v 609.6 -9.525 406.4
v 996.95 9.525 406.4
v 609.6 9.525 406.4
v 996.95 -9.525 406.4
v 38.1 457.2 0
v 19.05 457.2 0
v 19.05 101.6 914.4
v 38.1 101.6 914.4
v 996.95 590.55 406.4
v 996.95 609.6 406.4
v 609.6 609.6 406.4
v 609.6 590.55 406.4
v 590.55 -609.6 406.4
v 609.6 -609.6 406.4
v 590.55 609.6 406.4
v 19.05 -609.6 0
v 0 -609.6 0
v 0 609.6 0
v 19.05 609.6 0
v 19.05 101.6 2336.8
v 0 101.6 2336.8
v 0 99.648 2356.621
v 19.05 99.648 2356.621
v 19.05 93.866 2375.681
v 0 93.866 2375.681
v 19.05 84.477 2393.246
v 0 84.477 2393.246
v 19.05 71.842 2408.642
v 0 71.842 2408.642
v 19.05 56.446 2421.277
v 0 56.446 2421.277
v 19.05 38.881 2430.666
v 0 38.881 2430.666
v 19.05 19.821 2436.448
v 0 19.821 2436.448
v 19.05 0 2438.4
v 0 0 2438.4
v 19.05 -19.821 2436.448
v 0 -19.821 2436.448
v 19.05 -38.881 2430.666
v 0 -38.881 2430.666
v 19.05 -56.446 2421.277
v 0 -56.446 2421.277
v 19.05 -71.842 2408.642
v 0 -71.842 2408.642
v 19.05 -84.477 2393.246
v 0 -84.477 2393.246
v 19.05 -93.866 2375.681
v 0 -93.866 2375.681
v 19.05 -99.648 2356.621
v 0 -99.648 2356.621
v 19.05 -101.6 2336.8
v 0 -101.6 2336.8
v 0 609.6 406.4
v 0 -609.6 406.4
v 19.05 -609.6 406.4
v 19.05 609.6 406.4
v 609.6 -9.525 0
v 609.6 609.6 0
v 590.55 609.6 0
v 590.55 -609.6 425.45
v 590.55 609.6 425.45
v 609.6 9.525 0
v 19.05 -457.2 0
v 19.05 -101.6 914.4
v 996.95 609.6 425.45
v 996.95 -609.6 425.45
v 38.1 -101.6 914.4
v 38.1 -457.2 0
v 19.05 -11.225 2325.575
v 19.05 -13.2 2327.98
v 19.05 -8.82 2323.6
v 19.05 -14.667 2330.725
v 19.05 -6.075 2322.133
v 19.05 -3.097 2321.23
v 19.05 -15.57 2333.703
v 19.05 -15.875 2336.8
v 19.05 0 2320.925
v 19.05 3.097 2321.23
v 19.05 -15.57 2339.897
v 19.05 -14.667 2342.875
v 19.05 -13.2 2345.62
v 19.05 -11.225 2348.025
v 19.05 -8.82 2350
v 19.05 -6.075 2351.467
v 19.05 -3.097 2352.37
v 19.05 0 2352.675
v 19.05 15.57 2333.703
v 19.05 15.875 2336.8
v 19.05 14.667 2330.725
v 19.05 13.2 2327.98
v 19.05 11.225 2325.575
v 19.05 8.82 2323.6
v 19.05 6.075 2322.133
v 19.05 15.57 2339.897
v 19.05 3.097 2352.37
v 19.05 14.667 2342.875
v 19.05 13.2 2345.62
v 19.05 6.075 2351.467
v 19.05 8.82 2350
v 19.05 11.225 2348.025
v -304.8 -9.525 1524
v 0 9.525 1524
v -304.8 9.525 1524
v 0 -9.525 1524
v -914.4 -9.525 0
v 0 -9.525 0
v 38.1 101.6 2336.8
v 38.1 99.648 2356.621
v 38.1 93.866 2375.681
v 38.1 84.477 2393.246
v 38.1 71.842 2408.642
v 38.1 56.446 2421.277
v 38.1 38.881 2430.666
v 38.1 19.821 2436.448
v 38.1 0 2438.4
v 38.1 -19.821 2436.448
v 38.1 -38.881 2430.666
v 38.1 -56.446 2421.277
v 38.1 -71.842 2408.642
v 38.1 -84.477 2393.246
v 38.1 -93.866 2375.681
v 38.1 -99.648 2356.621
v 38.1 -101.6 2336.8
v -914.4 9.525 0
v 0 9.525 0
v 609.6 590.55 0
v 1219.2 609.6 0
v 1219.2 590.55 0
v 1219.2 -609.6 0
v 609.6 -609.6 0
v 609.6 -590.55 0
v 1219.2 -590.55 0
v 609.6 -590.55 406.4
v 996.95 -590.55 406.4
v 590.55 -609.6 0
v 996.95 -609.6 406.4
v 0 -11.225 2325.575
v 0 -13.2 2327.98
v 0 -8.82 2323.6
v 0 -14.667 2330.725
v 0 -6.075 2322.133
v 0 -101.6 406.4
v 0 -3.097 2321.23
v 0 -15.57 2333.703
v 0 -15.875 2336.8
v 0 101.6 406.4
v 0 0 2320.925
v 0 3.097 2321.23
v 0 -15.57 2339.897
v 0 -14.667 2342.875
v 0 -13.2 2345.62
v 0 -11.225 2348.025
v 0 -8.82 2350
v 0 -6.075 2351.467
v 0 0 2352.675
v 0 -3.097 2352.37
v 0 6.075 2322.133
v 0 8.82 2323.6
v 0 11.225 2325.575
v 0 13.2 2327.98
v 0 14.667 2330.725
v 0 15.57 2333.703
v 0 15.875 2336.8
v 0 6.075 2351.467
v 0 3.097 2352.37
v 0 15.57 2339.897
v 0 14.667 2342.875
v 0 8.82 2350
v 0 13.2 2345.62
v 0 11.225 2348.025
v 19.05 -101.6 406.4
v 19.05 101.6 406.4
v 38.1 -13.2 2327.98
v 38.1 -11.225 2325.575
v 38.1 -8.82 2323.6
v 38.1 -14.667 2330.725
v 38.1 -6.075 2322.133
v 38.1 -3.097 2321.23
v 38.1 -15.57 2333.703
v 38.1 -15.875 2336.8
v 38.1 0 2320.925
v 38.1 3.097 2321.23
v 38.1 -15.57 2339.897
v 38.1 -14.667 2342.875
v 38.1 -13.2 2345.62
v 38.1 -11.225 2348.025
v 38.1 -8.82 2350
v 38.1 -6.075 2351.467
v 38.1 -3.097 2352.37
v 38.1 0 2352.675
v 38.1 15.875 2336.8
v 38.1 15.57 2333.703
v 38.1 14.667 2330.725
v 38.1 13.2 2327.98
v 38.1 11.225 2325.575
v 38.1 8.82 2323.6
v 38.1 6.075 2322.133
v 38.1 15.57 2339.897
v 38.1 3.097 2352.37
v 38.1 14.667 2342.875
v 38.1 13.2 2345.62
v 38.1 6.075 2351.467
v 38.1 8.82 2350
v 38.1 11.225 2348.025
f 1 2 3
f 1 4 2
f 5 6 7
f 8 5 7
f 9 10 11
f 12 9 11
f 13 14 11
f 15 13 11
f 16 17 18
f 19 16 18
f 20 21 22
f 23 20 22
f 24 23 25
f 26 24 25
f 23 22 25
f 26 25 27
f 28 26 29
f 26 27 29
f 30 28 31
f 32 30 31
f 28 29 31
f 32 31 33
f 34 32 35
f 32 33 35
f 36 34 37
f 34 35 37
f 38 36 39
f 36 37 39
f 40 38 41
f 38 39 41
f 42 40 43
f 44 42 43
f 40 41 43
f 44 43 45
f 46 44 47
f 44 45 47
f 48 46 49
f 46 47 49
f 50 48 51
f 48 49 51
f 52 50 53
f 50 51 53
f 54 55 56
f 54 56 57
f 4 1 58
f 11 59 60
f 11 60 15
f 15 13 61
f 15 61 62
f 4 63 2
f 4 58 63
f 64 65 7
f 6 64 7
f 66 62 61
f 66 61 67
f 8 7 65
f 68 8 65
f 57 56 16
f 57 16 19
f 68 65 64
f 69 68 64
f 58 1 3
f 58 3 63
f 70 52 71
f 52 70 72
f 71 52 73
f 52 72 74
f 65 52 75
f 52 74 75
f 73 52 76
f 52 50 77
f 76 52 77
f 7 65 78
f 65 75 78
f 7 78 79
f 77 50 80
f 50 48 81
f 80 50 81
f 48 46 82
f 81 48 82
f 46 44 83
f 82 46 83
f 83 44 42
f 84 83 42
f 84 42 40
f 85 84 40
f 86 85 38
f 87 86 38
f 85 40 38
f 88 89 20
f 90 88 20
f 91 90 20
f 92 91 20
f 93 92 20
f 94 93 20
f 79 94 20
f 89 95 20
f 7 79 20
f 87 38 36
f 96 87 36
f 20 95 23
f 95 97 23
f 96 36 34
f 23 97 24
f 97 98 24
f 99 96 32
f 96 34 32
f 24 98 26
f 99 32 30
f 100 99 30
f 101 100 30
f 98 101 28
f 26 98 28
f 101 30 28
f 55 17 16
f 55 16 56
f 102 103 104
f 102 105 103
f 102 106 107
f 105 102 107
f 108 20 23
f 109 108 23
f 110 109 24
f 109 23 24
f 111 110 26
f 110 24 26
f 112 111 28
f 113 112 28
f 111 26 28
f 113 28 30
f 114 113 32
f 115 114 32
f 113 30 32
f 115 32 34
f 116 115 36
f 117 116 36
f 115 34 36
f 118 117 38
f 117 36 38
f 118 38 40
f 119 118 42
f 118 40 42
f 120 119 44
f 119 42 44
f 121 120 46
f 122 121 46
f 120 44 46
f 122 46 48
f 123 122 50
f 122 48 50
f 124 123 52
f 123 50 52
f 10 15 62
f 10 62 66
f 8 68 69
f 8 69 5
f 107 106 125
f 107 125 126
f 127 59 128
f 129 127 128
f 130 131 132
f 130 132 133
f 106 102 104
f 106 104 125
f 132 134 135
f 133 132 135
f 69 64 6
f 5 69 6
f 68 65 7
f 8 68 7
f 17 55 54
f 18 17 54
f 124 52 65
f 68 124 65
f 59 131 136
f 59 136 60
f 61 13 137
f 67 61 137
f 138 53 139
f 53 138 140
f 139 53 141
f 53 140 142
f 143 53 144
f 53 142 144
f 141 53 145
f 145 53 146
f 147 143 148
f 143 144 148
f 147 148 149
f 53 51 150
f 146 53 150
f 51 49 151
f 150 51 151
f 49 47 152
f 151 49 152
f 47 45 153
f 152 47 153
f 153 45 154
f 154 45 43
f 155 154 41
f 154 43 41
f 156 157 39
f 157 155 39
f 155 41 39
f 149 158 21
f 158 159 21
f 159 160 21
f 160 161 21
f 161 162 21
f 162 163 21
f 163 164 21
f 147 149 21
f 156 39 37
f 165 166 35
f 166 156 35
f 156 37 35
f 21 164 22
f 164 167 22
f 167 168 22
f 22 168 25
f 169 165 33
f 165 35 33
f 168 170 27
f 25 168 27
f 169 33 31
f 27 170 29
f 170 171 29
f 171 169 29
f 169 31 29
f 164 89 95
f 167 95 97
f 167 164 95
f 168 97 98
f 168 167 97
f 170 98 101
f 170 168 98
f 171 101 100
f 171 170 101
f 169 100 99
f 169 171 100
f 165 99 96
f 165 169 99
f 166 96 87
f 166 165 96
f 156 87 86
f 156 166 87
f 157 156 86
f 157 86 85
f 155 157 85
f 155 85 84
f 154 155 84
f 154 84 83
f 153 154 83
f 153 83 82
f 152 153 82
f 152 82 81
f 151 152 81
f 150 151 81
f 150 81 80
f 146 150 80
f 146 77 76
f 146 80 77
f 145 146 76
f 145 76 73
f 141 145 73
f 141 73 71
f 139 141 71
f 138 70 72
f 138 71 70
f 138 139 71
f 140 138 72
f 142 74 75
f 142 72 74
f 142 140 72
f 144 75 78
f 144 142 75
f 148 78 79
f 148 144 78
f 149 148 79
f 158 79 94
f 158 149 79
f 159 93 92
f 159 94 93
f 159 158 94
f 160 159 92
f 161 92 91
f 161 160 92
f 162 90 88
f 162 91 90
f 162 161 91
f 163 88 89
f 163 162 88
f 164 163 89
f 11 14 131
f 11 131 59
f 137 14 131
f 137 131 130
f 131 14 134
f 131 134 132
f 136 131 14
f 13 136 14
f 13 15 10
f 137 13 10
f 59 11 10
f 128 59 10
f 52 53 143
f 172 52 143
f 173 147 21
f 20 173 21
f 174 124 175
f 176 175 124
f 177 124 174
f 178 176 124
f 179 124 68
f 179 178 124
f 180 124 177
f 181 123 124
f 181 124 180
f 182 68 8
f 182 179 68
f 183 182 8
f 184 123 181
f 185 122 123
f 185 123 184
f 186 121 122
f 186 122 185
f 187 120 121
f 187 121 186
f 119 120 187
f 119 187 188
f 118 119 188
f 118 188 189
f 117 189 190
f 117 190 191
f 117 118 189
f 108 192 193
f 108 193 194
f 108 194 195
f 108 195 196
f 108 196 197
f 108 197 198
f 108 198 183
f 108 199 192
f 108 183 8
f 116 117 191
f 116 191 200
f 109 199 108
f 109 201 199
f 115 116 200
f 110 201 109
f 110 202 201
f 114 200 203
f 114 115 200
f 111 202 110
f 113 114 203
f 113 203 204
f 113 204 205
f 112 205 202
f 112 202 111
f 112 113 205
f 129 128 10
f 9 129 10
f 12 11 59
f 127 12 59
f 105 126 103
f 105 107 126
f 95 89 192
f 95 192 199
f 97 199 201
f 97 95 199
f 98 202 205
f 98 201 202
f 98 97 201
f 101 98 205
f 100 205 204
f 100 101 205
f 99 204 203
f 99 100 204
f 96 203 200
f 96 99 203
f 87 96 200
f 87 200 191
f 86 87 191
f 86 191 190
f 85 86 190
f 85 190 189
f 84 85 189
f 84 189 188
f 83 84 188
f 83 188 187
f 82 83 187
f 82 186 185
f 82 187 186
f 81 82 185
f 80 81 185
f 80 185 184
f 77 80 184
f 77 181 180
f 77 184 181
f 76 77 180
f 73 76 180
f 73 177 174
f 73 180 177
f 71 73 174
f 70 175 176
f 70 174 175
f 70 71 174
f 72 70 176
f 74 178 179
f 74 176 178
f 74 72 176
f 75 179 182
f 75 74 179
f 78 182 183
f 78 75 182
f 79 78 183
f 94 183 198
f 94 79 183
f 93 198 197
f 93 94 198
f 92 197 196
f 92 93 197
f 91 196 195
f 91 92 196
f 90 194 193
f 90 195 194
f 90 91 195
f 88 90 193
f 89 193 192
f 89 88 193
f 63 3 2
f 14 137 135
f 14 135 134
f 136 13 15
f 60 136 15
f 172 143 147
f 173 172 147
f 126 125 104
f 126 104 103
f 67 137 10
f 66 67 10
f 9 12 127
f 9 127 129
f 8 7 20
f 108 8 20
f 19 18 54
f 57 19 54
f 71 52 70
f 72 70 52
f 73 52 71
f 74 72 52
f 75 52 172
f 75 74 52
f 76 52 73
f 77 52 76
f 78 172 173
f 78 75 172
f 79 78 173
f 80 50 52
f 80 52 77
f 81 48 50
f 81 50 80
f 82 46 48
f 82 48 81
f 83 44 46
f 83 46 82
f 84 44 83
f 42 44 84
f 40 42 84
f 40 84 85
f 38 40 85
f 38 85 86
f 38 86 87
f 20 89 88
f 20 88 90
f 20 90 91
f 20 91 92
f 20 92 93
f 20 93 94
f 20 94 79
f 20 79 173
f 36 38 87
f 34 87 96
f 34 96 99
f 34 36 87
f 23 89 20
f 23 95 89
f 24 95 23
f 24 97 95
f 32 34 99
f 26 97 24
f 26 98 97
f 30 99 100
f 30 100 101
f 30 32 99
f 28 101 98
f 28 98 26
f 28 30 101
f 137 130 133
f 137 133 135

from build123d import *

# Parameters (mm, degrees)
F1_DEPTH  = 19.05
F2_W      = 1219.2
F2_H      = 406.4
F3_DEPTH  = 19.05
F7_DEPTH  = 19.05
F8_W      = 406.4
F8_H      = 1219.2
F9_DEPTH  = 19.05
F11_DEPTH = 19.05
F14_DEPTH = 9.525
F16_DEPTH = 9.525
F18_DEPTH = 19.05
F19_R     = 15.875
F20_DEPTH = 1219.201


with BuildPart() as f1:
    # F0 (on Right) → F1 (new body)
    with BuildSketch(Plane.YZ):
        with BuildLine():
            Line((101.6, 406.4), (101.6, 2336.8))
            ThreePointArc((101.6, 2336.8), (0, 2438.4), (-101.6, 2336.8))
            Line((-101.6, 2336.8), (-101.6, 406.4))
            Line((-101.6, 406.4), (101.6, 406.4))
        make_face()
    extrude(amount=F1_DEPTH)


with BuildPart() as f3:
    # F2 (on Right) → F3 (new body, through all)
    with BuildSketch(Plane.YZ):
        with Locations((0, 203.2)):
            Rectangle(F2_W, F2_H)
    extrude(amount=F3_DEPTH)


with BuildPart() as f5_1:
    # F5: instance of F3
    add(f3.part.mirror(Plane.YZ.offset(304.8)))


with BuildPart() as f7:
    # F6 (on face) → F7 (new body)
    with BuildSketch(Plane.YZ.offset(19.05)):
        Polygon((101.6, 914.4), (-101.6, 914.4), (-457.2, 0), (457.2, 0), align=None)
    extrude(amount=F7_DEPTH)


with BuildPart() as f9:
    # F8 (on face) → F9 (new body)
    with BuildSketch(Plane.XY.offset(406.4)):
        with Locations((793.7499999999, 0)):
            Rectangle(F8_W, F8_H)
    extrude(amount=F9_DEPTH)


with BuildPart() as f11:
    # F10 (on face) → F11 (new body)
    with BuildSketch(Plane.XZ.offset(609.6)):
        Polygon((996.9499999999, 406.4), (609.6, 406.4), (609.6, 0), (1219.2, 0), align=None)
    extrude(amount=-F11_DEPTH)


with BuildPart() as f12_1:
    # F12: instance of F11
    add(f11.part.mirror(Plane.XZ))


with BuildPart() as f14:
    # F13 (on Front) → F14 (new body, symmetric)
    with BuildSketch(Plane.XZ):
        Polygon((996.9499999999, 406.4), (609.6, 406.4), (609.6, 0), align=None)
    extrude(amount=F14_DEPTH, both=True)


with BuildPart() as f16:
    # F15 (on Front) → F16 (new body, symmetric)
    with BuildSketch(Plane.XZ):
        Polygon((0, 406.4), (0, 1524), (-304.8, 1524), (-914.4, 0), (0, 0), align=None)
    extrude(amount=F16_DEPTH, both=True)


with BuildPart() as f18:
    # F17 (on face) → F18 (new body, through all)
    with BuildSketch(Plane.YZ.offset(19.05)):
        with BuildLine():
            Line((101.6, 914.4), (101.6, 2336.8))
            ThreePointArc((101.6, 2336.8), (0, 2438.4), (-101.6, 2336.8))
            Line((-101.6, 2336.8), (-101.6, 914.4))
            Line((-101.6, 914.4), (101.6, 914.4))
        make_face()
    extrude(amount=F18_DEPTH)


with BuildPart() as f20_tool:
    # F19 (on face) → F20 (new body, through all)
    with BuildSketch(Plane.YZ):
        with Locations((0, 2336.8)):
            Circle(F19_R)
    extrude(amount=F20_DEPTH)


with BuildPart() as f1_1:
    add(f1.part)

    # F20: cut by f20_tool
    add(f20_tool.part, mode=Mode.SUBTRACT)


with BuildPart() as f18_1:
    add(f18.part)

    # F20: cut by f20_tool
    add(f20_tool.part, mode=Mode.SUBTRACT)


solid = Compound([f3.part, f5_1.part, f7.part, f9.part, f11.part, f12_1.part, f14.part, f16.part, f1_1.part, f18_1.part])
